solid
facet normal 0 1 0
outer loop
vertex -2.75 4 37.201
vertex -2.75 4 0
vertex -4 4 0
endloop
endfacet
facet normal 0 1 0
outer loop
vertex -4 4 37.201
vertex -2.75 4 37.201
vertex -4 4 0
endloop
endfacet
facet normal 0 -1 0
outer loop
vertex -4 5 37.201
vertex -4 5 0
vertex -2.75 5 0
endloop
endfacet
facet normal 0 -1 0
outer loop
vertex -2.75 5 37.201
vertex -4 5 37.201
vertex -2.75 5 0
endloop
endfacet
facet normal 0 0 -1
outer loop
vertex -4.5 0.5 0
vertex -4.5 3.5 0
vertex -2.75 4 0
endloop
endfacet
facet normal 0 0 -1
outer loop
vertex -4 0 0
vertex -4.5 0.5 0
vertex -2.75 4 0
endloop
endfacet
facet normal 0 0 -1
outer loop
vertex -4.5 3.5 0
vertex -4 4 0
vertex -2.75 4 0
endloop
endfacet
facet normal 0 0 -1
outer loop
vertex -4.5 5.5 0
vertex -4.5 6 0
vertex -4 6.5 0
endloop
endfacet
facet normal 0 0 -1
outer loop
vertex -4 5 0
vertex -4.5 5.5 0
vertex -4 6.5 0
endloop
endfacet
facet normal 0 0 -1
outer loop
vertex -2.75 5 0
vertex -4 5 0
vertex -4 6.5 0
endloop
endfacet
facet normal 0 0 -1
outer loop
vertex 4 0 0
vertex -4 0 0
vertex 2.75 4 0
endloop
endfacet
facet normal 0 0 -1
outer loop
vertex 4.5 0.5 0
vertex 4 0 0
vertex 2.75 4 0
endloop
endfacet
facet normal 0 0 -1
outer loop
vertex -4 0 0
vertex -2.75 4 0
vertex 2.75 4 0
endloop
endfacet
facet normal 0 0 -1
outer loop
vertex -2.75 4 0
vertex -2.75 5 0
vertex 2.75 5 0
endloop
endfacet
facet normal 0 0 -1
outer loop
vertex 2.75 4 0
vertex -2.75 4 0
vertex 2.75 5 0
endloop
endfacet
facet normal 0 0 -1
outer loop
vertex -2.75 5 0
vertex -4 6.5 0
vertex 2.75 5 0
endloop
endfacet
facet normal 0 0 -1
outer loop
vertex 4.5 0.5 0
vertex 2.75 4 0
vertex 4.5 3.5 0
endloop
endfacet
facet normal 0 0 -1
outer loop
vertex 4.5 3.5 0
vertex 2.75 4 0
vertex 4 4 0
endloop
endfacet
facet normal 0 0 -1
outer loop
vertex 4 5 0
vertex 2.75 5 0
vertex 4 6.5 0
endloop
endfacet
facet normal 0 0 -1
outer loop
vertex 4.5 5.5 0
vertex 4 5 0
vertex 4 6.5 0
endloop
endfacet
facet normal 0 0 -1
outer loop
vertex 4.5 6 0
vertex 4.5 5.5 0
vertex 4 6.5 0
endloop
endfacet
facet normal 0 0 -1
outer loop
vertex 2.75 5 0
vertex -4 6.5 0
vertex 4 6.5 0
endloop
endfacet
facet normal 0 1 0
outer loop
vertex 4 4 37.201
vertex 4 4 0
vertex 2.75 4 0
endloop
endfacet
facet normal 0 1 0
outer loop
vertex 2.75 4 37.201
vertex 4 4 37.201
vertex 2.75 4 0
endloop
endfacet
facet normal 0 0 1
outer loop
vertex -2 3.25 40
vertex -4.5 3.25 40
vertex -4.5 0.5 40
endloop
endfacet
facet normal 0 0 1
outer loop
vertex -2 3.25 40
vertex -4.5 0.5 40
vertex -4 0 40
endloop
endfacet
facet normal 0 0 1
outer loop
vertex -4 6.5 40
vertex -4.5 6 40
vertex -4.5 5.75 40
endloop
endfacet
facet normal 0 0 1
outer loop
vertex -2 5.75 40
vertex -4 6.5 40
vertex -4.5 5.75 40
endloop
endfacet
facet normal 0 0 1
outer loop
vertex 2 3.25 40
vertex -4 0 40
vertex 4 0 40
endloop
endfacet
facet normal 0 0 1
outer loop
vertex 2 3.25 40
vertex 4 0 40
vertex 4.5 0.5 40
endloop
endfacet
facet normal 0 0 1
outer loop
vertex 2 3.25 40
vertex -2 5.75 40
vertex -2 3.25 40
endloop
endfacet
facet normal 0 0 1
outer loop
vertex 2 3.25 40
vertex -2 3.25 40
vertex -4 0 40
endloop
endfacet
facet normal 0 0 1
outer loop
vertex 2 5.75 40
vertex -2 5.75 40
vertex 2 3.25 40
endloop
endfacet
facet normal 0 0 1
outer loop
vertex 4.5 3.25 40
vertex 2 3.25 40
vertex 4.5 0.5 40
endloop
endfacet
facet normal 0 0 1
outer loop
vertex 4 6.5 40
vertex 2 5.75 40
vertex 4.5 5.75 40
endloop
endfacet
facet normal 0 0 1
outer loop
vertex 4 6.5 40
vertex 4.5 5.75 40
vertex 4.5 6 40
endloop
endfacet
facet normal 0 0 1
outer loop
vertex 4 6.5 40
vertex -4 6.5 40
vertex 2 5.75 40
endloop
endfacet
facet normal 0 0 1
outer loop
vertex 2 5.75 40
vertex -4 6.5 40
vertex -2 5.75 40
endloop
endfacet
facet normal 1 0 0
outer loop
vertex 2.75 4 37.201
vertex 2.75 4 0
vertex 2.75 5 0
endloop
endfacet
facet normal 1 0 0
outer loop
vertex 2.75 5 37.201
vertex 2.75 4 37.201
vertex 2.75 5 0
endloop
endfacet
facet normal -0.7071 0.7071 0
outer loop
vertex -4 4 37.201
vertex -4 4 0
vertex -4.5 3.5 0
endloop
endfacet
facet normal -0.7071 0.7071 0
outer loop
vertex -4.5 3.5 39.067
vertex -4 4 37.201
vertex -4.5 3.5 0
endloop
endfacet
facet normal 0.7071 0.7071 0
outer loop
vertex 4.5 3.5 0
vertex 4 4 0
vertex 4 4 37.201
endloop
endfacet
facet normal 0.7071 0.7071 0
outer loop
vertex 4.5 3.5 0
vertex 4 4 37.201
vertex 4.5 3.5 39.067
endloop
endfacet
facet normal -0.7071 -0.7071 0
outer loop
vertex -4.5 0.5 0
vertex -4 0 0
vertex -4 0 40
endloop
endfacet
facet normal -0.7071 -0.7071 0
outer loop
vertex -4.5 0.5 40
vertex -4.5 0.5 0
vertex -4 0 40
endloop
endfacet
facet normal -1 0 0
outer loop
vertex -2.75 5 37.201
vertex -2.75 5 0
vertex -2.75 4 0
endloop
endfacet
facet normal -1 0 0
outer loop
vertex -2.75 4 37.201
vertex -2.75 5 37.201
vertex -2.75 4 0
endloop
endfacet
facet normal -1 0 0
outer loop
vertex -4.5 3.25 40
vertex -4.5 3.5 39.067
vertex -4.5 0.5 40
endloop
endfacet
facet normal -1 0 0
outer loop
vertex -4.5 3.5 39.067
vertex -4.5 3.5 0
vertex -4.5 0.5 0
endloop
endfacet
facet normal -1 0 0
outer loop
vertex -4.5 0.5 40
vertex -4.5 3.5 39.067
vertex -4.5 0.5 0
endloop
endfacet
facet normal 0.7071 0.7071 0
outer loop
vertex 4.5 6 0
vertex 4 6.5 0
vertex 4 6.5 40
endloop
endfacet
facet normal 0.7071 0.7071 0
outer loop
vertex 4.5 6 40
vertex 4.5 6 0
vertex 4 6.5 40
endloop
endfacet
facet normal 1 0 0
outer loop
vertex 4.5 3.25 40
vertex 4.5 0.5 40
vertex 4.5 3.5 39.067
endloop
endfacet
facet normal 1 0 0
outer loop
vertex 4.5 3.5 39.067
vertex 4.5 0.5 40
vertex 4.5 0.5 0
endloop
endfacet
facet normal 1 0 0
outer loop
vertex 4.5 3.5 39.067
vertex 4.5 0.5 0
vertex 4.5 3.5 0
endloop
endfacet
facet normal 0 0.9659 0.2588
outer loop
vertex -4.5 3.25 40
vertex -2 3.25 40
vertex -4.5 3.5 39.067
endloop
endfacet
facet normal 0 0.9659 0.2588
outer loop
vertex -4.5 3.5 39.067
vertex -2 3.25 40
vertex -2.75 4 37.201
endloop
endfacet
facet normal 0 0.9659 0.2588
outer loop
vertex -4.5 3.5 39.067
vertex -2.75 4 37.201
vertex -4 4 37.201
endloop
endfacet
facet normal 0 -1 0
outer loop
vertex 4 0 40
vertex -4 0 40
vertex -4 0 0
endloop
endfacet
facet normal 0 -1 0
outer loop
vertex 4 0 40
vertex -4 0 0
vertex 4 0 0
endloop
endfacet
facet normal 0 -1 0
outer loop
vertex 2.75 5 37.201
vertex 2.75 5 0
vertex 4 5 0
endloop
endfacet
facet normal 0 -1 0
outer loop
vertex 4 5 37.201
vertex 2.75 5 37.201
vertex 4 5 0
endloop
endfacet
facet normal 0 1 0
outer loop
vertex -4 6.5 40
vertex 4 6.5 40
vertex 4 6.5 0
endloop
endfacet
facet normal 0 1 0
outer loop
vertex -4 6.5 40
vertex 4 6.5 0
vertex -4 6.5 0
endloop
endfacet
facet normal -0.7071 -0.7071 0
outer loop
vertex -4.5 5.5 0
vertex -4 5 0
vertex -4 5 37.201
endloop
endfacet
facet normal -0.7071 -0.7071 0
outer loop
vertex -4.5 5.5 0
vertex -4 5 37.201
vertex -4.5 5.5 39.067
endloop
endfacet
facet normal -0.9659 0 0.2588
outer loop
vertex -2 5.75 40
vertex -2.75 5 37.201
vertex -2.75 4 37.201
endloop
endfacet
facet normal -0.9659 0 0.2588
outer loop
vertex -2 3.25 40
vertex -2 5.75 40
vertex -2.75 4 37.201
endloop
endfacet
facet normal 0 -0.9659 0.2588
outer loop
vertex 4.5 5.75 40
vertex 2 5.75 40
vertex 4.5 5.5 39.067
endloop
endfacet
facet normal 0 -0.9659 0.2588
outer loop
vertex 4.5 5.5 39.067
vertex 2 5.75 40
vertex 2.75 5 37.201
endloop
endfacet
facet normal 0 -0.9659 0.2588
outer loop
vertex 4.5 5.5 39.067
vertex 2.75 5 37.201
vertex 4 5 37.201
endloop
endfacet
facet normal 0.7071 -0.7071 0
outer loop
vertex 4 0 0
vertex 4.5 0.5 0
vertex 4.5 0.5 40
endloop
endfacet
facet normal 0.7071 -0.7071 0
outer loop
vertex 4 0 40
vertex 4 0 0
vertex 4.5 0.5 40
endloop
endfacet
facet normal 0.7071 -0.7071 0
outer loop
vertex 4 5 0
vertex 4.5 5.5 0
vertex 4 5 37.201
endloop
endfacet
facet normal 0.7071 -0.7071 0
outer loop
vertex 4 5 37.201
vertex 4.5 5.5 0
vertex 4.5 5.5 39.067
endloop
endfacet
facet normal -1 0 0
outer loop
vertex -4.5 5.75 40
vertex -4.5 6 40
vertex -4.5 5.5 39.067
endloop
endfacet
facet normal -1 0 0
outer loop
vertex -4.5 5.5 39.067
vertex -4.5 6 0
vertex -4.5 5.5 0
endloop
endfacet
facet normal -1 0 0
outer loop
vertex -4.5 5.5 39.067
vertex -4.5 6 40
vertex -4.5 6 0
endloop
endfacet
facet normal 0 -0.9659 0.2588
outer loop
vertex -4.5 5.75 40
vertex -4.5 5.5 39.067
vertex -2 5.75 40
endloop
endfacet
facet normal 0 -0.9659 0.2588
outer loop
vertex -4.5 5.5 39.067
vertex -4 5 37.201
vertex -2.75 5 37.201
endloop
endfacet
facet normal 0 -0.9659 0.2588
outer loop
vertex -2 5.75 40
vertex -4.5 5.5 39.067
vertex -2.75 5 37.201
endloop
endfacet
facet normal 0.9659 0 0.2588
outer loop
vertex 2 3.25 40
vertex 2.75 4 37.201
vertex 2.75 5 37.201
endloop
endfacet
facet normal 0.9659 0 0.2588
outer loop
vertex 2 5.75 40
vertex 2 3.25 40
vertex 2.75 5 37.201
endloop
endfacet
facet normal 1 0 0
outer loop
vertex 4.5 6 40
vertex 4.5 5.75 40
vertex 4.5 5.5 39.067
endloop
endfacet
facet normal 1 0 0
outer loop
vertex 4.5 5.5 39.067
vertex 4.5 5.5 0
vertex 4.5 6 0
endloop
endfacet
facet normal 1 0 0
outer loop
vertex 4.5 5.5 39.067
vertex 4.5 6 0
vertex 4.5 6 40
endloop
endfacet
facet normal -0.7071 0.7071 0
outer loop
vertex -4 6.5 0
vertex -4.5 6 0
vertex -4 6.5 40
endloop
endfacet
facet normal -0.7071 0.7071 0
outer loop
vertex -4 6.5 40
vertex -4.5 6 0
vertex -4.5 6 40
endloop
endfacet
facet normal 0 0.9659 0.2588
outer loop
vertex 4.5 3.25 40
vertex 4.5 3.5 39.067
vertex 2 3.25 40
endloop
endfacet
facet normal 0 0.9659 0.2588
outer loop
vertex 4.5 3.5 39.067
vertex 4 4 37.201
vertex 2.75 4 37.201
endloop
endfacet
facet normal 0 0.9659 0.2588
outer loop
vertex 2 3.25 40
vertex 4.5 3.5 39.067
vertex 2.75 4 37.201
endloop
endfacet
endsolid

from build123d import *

# Parameters (mm, degrees)
F1_DEPTH = 40
F2_SIZE  = 0.5
F3_SIZE2 = 2.799038
F3_SIZE  = 0.75


with BuildPart() as f1:
    # F0 (on Top) → F1 (new body)
    with BuildSketch(Plane.XY):
        Polygon((-4.5, 4), (-4.5, 0), (4.5, 0), (4.5, 4), (2.75, 4), (2.75, 5), (4.5, 5), (4.5, 6.5), (-4.5, 6.5), (-4.5, 5), (-2.75, 5), (-2.75, 4), align=None)
    extrude(amount=F1_DEPTH)

    # F2
    f2_edges = [f1.edges().sort_by_distance(p)[0] for p in [
        (-4.5, 5, 20),
        (-4.5, 4, 20),
        (4.5, 4, 20),
        (4.5, 5, 20),
        (4.5, 6.5, 20),
        (4.5, 0, 20),
        (-4.5, 6.5, 20),
        (-4.5, 0, 20),
    ]]
    chamfer(f2_edges, length=F2_SIZE)

    # F3
    f3_edges = [f1.edges().sort_by_distance(p)[0] for p in [
        (-2.75, 4.5, 40),
        (2.75, 4.5, 40),
        (-3.375, 4, 40),
        (-3.375, 5, 40),
        (3.375, 5, 40),
        (3.375, 4, 40),
    ]]
    chamfer(f3_edges, length=F3_SIZE, length2=F3_SIZE2)


solid = f1.part
